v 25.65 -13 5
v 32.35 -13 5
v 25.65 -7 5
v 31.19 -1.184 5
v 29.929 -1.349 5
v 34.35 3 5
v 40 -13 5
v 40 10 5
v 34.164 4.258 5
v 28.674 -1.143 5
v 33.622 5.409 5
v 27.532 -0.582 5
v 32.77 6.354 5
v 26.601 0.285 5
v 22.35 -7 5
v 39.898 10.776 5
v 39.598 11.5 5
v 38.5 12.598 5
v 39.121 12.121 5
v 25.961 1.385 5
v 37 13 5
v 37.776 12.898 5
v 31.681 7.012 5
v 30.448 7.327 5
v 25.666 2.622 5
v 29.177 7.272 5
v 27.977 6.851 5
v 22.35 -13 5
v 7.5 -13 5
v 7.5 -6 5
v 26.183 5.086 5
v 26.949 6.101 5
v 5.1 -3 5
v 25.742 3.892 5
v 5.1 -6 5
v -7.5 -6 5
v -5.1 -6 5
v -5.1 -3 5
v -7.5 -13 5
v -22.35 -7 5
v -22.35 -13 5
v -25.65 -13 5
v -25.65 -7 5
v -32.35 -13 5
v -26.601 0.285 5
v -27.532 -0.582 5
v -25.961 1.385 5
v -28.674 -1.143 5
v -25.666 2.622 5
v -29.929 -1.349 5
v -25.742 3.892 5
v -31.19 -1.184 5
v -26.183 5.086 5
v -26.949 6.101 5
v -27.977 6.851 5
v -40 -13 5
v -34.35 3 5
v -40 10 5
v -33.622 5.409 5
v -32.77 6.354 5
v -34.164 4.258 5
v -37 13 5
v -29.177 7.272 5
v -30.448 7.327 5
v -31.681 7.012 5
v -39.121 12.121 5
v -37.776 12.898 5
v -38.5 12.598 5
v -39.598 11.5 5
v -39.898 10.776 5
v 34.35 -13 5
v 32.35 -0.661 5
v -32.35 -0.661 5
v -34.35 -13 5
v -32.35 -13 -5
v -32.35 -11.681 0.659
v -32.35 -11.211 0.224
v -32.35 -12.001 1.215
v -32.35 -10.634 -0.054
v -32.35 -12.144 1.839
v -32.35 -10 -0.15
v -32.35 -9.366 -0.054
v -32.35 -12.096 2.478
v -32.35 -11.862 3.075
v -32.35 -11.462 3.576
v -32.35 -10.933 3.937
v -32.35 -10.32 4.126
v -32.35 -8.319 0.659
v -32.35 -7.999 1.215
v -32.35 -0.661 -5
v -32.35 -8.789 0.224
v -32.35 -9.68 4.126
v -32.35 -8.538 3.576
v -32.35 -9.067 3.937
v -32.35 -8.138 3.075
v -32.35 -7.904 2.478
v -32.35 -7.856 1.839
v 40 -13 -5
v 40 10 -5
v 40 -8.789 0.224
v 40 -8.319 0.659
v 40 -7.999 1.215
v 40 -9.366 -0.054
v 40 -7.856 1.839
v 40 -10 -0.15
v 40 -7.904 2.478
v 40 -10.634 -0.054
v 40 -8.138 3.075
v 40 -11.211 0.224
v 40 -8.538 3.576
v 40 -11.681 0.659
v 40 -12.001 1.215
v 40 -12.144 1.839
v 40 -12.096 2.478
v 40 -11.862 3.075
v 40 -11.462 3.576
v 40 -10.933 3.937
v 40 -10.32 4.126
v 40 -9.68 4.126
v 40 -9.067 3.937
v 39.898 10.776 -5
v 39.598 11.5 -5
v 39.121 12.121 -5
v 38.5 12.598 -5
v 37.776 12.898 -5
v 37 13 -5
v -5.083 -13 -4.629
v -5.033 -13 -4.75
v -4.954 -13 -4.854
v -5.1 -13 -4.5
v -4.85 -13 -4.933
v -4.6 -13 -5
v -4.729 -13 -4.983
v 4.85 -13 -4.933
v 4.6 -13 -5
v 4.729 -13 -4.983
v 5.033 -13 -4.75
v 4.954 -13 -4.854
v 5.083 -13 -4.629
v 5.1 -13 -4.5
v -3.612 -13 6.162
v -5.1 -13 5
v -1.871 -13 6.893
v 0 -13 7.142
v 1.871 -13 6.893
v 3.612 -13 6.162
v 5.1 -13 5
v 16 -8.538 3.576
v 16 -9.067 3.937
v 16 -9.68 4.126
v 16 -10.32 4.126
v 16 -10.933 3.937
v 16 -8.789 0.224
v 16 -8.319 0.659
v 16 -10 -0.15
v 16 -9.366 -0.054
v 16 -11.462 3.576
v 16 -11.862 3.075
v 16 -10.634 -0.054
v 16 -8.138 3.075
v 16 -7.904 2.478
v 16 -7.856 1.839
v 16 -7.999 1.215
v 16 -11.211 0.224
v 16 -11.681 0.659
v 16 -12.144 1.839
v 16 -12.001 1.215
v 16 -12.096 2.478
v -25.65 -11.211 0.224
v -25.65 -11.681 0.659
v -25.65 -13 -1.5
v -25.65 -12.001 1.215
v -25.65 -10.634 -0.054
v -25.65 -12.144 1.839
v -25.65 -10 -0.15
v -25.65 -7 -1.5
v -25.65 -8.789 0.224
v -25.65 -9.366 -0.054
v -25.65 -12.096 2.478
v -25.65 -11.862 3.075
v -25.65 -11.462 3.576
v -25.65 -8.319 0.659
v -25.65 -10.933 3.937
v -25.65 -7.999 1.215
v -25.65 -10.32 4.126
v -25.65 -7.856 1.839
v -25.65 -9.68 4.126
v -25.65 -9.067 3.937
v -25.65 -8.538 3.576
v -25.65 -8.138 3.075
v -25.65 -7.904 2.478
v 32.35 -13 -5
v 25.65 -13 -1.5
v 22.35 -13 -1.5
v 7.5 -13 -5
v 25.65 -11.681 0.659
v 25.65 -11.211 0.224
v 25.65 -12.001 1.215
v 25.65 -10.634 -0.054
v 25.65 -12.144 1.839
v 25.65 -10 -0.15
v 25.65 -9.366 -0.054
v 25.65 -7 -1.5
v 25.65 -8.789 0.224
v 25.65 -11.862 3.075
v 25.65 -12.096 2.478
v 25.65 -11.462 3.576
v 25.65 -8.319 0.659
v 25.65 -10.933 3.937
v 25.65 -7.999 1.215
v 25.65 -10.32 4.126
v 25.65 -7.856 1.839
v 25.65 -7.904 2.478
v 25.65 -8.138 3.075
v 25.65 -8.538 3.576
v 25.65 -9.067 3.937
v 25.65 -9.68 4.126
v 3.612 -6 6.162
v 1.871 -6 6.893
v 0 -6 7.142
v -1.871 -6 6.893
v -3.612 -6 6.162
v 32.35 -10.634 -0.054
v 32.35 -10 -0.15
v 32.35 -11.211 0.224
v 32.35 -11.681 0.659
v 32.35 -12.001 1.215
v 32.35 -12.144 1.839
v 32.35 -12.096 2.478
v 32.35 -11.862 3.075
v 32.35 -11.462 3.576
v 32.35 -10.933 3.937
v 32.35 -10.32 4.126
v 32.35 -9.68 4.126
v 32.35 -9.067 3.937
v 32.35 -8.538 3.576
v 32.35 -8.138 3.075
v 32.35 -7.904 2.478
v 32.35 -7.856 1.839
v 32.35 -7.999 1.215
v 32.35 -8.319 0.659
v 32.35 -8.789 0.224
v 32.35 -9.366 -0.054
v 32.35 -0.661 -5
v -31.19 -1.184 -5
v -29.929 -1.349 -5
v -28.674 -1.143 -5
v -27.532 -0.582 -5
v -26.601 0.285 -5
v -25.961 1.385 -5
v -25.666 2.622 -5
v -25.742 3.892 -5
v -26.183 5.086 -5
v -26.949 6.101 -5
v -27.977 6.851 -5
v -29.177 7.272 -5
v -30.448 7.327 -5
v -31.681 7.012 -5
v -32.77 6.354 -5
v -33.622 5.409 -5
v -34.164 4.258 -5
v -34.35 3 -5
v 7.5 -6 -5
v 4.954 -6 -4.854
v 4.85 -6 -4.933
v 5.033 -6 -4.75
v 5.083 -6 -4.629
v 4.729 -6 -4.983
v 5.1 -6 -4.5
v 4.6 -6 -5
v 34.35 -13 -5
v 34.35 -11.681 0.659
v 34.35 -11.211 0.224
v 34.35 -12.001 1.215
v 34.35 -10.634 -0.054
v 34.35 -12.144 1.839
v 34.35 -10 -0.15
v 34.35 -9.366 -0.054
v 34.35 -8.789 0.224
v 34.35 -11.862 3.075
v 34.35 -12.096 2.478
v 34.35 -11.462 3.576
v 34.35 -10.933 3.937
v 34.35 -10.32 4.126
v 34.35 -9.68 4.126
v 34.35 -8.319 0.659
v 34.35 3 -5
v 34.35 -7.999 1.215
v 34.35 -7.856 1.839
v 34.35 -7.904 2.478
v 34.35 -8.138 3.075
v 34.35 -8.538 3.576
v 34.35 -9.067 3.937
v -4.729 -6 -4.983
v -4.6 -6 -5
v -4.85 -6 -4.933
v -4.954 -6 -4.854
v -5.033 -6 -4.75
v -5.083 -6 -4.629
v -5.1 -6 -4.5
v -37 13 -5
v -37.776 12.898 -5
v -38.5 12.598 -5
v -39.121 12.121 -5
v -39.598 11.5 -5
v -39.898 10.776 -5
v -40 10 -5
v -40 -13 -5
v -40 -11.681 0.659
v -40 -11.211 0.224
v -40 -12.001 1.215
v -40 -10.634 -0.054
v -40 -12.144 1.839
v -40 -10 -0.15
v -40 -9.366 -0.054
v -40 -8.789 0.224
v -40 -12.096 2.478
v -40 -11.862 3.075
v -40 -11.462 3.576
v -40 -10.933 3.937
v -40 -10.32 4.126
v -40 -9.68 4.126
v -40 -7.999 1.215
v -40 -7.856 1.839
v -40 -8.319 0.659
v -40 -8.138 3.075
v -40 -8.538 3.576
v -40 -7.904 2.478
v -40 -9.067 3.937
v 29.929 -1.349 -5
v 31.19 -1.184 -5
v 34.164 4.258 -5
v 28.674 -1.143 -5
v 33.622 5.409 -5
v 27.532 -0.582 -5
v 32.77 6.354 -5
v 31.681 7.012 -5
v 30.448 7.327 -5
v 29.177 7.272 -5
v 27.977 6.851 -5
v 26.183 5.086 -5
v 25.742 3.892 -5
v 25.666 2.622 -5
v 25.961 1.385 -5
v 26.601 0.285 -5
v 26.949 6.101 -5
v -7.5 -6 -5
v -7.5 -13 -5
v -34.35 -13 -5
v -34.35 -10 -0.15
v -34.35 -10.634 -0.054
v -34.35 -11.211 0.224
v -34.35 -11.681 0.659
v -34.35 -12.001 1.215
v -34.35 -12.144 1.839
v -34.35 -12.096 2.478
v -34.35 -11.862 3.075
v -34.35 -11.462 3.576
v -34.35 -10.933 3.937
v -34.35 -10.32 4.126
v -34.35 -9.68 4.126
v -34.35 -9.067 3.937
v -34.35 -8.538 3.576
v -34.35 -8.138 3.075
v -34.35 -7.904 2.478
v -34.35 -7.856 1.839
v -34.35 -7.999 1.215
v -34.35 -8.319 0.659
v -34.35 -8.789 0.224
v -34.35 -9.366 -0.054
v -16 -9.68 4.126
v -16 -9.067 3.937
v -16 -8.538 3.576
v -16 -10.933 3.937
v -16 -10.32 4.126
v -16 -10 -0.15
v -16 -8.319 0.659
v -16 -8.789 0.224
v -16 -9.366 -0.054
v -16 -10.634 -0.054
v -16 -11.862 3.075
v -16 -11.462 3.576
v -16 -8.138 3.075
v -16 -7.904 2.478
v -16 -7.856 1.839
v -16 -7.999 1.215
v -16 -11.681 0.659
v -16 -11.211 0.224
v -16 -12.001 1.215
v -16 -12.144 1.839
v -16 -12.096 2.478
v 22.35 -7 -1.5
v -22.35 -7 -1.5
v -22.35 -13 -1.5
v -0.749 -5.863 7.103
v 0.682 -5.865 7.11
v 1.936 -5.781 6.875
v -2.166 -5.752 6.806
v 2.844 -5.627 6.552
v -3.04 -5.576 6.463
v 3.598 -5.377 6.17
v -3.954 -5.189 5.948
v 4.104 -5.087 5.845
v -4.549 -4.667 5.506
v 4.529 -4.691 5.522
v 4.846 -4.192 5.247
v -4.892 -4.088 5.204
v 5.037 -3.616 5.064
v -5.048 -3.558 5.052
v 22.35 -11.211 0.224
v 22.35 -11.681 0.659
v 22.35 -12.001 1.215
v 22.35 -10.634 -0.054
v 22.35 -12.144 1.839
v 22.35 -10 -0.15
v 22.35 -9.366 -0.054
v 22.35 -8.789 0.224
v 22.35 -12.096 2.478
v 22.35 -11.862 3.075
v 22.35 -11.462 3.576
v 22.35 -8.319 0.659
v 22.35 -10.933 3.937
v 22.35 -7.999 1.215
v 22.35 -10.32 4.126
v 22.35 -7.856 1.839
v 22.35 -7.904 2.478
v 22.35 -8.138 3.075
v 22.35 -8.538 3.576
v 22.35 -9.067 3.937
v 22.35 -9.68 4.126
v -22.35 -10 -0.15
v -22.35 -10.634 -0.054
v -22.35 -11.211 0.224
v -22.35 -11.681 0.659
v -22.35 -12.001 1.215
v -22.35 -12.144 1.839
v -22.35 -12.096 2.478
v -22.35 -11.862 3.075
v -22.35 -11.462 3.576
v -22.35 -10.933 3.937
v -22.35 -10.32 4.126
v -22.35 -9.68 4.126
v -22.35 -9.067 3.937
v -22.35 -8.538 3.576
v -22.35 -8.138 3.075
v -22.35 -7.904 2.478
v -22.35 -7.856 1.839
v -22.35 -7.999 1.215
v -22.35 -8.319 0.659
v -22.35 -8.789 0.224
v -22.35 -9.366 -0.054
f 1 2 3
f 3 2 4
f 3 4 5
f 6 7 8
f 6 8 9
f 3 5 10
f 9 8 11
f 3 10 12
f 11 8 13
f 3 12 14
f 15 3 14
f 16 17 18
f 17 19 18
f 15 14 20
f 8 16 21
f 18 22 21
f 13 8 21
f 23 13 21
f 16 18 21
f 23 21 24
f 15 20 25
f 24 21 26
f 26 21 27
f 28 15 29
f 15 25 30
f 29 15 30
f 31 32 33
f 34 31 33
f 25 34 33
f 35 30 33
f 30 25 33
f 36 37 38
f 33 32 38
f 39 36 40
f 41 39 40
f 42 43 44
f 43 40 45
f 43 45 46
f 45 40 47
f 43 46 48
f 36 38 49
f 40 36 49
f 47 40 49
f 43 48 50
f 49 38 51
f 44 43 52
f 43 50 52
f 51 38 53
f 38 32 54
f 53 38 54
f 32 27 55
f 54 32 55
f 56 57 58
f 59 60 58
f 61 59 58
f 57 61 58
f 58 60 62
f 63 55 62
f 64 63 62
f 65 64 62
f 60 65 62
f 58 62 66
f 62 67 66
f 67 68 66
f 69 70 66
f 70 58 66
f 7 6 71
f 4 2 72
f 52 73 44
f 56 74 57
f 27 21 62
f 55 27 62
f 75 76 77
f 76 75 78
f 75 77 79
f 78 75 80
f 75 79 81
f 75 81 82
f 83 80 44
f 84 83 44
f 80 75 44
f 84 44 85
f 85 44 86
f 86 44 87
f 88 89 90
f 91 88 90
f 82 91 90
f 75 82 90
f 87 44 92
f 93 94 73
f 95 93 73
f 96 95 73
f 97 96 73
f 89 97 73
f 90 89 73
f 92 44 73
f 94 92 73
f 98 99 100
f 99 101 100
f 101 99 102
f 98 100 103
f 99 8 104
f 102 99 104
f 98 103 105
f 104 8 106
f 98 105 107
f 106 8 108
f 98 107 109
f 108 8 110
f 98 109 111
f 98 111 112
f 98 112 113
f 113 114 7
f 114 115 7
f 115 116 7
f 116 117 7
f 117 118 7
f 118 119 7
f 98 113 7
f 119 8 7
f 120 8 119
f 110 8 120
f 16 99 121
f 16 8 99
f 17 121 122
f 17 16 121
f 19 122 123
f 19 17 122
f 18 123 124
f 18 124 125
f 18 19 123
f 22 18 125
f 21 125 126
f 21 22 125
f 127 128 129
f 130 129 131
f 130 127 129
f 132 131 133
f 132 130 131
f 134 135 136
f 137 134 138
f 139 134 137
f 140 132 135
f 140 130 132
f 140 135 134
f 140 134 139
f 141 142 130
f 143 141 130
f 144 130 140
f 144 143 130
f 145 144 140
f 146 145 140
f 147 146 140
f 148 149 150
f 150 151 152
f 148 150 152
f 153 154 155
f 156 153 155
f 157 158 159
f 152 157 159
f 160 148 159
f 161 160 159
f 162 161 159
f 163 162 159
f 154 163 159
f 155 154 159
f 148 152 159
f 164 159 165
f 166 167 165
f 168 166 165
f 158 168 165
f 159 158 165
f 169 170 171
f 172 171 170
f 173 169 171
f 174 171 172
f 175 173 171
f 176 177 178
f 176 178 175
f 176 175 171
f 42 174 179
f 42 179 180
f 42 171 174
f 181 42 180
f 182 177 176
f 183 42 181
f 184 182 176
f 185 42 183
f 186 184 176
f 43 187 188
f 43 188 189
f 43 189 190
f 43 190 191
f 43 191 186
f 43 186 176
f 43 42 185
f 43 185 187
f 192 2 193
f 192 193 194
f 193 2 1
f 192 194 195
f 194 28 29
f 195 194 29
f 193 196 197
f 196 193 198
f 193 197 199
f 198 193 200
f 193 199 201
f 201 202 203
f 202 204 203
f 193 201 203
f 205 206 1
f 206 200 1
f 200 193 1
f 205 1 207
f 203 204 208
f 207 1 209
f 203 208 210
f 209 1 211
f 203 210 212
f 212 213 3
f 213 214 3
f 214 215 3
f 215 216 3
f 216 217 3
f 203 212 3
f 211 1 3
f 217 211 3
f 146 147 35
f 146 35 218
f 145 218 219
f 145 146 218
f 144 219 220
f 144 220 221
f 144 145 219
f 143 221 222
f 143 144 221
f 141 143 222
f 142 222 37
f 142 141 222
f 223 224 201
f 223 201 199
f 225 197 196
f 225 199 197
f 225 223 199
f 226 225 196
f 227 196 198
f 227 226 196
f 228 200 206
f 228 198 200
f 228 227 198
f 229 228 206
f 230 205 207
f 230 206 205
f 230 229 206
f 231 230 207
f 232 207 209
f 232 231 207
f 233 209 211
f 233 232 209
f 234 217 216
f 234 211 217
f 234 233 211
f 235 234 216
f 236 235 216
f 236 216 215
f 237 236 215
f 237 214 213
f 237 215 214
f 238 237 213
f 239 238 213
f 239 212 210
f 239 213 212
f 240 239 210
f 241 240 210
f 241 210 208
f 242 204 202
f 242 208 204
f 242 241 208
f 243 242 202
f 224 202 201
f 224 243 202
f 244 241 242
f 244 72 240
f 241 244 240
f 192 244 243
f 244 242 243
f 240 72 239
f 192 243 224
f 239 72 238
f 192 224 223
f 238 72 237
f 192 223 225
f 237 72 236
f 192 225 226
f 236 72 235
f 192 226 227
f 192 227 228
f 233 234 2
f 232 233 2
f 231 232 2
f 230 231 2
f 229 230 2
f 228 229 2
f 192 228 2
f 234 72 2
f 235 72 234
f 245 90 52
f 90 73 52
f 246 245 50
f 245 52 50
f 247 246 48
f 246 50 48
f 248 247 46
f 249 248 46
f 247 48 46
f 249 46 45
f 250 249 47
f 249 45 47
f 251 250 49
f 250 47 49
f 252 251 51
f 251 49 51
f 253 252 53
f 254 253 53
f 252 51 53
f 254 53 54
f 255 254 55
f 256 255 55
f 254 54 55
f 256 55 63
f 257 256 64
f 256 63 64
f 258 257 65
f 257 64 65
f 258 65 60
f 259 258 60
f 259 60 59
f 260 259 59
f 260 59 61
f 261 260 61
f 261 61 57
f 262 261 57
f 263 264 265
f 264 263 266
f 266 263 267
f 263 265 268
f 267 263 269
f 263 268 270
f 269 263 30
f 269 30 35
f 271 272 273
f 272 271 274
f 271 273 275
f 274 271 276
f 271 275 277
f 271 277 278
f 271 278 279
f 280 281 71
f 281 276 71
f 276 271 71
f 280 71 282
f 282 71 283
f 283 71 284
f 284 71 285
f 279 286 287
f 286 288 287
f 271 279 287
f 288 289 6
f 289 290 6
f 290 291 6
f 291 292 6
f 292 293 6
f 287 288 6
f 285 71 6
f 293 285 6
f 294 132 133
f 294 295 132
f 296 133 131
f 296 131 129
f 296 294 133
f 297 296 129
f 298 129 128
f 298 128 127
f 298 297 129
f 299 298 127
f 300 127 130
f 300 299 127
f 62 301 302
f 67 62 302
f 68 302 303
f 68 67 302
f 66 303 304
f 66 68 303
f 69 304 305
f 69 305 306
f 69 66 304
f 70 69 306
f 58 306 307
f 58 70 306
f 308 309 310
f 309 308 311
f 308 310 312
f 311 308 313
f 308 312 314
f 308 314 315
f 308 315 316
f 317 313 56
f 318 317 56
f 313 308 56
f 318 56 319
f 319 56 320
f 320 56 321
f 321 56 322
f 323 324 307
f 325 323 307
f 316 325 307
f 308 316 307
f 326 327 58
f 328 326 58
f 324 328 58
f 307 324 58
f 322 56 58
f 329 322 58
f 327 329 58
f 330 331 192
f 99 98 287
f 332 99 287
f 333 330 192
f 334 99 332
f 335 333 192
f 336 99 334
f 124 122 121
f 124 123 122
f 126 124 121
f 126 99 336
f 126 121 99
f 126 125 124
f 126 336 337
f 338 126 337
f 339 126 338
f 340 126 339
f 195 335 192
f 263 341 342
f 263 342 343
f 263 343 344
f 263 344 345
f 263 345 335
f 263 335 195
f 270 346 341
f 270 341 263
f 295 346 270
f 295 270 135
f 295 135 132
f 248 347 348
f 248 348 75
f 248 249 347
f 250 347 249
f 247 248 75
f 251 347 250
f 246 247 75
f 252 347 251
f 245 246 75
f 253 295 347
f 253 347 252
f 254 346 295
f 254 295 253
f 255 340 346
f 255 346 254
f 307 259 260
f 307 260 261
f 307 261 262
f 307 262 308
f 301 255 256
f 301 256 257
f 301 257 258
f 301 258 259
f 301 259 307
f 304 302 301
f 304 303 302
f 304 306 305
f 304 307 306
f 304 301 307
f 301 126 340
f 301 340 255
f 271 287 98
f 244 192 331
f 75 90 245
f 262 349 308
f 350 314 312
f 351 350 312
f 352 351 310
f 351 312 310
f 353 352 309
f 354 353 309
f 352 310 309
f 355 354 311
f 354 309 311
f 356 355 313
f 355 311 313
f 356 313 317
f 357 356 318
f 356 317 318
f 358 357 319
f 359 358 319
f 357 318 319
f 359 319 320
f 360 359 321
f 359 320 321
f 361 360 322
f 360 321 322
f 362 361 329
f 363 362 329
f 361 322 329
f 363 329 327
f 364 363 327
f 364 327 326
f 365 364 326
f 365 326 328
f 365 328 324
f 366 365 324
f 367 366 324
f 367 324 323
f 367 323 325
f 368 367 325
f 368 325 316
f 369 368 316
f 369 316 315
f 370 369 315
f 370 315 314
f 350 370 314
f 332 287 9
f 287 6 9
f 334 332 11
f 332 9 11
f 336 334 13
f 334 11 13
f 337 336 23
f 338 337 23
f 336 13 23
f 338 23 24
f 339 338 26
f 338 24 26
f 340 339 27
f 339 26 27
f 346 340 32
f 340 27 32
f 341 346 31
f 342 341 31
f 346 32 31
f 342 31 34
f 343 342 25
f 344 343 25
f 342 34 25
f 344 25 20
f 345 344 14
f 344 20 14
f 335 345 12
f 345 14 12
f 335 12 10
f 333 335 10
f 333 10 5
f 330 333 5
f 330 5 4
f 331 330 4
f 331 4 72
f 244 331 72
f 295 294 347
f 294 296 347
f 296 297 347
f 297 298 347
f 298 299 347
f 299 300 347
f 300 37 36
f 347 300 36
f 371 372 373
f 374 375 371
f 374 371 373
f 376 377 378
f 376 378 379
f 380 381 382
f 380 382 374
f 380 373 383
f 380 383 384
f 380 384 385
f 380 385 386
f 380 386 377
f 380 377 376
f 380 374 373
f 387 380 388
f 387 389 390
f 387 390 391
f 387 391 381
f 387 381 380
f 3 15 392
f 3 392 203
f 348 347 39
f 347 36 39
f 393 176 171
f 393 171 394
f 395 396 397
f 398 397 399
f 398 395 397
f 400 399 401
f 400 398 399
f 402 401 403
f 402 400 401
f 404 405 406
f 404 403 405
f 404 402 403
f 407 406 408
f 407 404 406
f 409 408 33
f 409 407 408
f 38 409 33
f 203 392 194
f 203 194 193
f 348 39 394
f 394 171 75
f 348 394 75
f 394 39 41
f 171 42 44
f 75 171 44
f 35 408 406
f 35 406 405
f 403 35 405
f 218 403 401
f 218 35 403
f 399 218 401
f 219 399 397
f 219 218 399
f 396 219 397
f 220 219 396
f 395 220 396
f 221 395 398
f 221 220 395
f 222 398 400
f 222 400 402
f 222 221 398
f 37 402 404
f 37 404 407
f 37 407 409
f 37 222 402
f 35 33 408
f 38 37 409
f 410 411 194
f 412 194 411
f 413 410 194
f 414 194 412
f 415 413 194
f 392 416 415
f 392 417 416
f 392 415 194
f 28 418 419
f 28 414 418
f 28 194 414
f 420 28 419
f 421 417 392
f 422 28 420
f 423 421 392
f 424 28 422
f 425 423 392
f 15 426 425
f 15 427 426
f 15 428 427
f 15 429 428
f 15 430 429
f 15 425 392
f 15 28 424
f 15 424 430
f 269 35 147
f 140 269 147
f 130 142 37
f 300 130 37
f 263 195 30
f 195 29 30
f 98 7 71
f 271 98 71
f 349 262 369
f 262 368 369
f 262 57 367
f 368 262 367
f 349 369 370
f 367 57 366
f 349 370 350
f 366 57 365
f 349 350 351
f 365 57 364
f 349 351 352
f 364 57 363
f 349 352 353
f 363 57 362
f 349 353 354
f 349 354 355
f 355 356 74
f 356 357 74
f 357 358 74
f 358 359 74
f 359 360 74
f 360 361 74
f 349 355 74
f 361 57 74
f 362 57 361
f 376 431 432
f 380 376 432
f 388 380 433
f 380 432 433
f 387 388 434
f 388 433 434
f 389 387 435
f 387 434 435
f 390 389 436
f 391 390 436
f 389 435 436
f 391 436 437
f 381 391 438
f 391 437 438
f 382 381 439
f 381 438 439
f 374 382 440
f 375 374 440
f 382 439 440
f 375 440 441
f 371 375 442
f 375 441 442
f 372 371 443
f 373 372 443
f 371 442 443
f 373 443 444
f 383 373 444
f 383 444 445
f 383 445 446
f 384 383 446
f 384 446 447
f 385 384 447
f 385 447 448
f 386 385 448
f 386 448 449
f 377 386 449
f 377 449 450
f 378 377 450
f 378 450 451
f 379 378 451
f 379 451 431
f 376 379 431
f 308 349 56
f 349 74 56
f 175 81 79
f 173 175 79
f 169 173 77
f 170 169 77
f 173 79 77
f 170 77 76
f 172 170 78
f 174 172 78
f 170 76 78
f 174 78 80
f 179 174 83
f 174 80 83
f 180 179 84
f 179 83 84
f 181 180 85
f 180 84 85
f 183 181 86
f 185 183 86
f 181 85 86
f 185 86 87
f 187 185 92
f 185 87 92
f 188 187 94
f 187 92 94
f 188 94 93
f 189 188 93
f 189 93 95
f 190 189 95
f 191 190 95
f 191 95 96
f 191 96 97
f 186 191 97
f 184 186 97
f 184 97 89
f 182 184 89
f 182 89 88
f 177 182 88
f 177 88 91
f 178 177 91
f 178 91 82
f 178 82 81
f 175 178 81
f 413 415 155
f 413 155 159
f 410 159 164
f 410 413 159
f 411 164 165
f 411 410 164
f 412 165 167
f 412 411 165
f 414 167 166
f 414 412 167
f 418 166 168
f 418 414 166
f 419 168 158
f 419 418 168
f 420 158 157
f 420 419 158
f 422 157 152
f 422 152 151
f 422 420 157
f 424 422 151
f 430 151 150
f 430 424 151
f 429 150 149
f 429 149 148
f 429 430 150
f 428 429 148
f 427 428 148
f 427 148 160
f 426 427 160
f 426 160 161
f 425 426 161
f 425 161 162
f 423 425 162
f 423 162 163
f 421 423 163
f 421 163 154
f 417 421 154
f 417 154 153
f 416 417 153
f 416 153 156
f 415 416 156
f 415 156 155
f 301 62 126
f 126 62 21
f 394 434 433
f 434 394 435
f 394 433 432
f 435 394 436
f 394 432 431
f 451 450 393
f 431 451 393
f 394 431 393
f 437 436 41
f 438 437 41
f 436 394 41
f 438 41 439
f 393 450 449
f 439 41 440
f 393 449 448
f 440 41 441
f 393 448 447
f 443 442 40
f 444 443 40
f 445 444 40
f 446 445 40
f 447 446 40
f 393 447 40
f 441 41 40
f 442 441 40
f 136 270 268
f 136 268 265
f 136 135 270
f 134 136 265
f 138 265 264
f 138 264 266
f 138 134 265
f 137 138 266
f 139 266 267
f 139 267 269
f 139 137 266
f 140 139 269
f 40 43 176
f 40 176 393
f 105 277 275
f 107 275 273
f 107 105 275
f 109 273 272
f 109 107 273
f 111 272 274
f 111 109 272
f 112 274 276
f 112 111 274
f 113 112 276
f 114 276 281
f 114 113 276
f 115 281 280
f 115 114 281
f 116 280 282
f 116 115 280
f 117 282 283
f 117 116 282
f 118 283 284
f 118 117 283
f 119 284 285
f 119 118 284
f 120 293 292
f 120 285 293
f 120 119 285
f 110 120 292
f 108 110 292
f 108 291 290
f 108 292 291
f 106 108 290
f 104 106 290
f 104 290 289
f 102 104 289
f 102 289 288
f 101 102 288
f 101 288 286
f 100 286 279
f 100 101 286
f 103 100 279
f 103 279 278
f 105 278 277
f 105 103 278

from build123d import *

# Parameters (mm, degrees)
BOSS_EXTRUDE1_DEPTH = 5
SKETCH2_W           = 3.3
SKETCH2_H           = 6
CUT_EXTRUDE2_DEPTH  = 6.5
SKETCH3_R           = 2.15
CUT_EXTRUDE4_DEPTH  = 24
FILLET1_R           = 0.5
FILLET2_R           = 3
BOSS_EXTRUDE2_DEPTH = 7
FILLET3_R           = 3


with BuildPart() as part:
    # Sketch1 → Boss-Extrude1 (new, symmetric)
    with BuildSketch(Plane.XY):
        with BuildLine():
            Line((40, -13), (34.35, -13))
            Line((34.35, -13), (34.35, 3))
            ThreePointArc((34.35, 3), (26.182605601, 5.085665361), (32.35, -0.660601044))
            Line((32.35, -0.660601044), (32.35, -13))
            Line((32.35, -13), (7.5, -13))
            Line((7.5, -13), (7.5, -6))
            Line((7.5, -6), (5.1, -6))
            Line((5.1, -6), (5.1, -13))
            Line((5.1, -13), (-5.1, -13))
            Line((-5.1, -13), (-5.1, -6))
            Line((-5.1, -6), (-7.5, -6))
            Line((-7.5, -6), (-7.5, -13))
            Line((-7.5, -13), (-32.35, -13))
            Line((-32.35, -13), (-32.35, -0.660601044))
            ThreePointArc((-32.35, -0.660601044), (-26.182605601, 5.085665361), (-34.35, 3))
            Line((-34.35, 3), (-34.35, -13))
            Line((-34.35, -13), (-40, -13))
            Line((-40, -13), (-40, 13))
            Line((-40, 13), (40, 13))
            Line((40, 13), (40, -13))
        make_face()
    extrude(amount=BOSS_EXTRUDE1_DEPTH, both=True)

    # Sketch2 → Cut-Extrude2 (cut)
    with BuildSketch(Plane.XY.offset(5)):
        with Locations((-24, -10)):
            Rectangle(SKETCH2_W, SKETCH2_H)
        with Locations((24, -10)):
            Rectangle(SKETCH2_W, SKETCH2_H)
    extrude(amount=-CUT_EXTRUDE2_DEPTH, mode=Mode.SUBTRACT)

    # Sketch3 → Cut-Extrude4 (cut)
    with BuildSketch(Plane.ZY.offset(40)):
        with Locations(Location((2, -10, 0), (0, 0, 180))):
            Circle(SKETCH3_R)
    cut_extrude4 = extrude(amount=-CUT_EXTRUDE4_DEPTH, mode=Mode.SUBTRACT)

    # Mirror1: Cut-Extrude4 across plane
    add(cut_extrude4.mirror(Plane(origin=(0, 0, 0), x_dir=(0, 0, 1), z_dir=(1, 0, 0))), mode=Mode.SUBTRACT)

    # Fillet1
    fillet1_edges = [part.edges().sort_by_distance(p)[0] for p in [
        (5.1, -9.5, -5),
        (-5.1, -9.5, -5),
    ]]
    fillet(fillet1_edges, radius=FILLET1_R)

    # Fillet2
    fillet2_edges = [part.edges().sort_by_distance(p)[0] for p in [
        (-40, 13, 0),
        (40, 13, 0),
    ]]
    fillet(fillet2_edges, radius=FILLET2_R)

    # Sketch4 → Boss-Extrude2 (add)
    with BuildSketch(Plane.XZ.offset(13)):
        with BuildLine():
            Line((-5.1, 5), (5.1, 5))
            ThreePointArc((5.1, 5), (0, 7.142128534), (-5.1, 5))
        make_face()
    extrude(amount=-BOSS_EXTRUDE2_DEPTH)

    # Fillet3
    # the kernel refuses this fillet: 3 mm, written as the material it adds along each edge
    with BuildSketch(Plane(origin=(-12.6, -6, 5), x_dir=(0, 1, 0), z_dir=(1, 0, 0))) as fillet3_piece_1_section:
        with BuildLine():
            CenterArc((FILLET3_R, FILLET3_R), FILLET3_R, 180, 90)
            Line((0, FILLET3_R), (0, 0))
            Line((0, 0), (FILLET3_R, 0))
        make_face()
    fillet3_piece_1 = extrude(amount=25.2, mode=Mode.PRIVATE)
    fillet3_piece_1 = fillet3_piece_1 & Plane(origin=(0, -5.25920744, 0), x_dir=(0.7140728391445785, 0, 0.7000714109260576), z_dir=(0, -1, 0)) * Cylinder(7.142128534, 63, mode=Mode.PRIVATE)
    add(fillet3_piece_1)


solid = part.part
